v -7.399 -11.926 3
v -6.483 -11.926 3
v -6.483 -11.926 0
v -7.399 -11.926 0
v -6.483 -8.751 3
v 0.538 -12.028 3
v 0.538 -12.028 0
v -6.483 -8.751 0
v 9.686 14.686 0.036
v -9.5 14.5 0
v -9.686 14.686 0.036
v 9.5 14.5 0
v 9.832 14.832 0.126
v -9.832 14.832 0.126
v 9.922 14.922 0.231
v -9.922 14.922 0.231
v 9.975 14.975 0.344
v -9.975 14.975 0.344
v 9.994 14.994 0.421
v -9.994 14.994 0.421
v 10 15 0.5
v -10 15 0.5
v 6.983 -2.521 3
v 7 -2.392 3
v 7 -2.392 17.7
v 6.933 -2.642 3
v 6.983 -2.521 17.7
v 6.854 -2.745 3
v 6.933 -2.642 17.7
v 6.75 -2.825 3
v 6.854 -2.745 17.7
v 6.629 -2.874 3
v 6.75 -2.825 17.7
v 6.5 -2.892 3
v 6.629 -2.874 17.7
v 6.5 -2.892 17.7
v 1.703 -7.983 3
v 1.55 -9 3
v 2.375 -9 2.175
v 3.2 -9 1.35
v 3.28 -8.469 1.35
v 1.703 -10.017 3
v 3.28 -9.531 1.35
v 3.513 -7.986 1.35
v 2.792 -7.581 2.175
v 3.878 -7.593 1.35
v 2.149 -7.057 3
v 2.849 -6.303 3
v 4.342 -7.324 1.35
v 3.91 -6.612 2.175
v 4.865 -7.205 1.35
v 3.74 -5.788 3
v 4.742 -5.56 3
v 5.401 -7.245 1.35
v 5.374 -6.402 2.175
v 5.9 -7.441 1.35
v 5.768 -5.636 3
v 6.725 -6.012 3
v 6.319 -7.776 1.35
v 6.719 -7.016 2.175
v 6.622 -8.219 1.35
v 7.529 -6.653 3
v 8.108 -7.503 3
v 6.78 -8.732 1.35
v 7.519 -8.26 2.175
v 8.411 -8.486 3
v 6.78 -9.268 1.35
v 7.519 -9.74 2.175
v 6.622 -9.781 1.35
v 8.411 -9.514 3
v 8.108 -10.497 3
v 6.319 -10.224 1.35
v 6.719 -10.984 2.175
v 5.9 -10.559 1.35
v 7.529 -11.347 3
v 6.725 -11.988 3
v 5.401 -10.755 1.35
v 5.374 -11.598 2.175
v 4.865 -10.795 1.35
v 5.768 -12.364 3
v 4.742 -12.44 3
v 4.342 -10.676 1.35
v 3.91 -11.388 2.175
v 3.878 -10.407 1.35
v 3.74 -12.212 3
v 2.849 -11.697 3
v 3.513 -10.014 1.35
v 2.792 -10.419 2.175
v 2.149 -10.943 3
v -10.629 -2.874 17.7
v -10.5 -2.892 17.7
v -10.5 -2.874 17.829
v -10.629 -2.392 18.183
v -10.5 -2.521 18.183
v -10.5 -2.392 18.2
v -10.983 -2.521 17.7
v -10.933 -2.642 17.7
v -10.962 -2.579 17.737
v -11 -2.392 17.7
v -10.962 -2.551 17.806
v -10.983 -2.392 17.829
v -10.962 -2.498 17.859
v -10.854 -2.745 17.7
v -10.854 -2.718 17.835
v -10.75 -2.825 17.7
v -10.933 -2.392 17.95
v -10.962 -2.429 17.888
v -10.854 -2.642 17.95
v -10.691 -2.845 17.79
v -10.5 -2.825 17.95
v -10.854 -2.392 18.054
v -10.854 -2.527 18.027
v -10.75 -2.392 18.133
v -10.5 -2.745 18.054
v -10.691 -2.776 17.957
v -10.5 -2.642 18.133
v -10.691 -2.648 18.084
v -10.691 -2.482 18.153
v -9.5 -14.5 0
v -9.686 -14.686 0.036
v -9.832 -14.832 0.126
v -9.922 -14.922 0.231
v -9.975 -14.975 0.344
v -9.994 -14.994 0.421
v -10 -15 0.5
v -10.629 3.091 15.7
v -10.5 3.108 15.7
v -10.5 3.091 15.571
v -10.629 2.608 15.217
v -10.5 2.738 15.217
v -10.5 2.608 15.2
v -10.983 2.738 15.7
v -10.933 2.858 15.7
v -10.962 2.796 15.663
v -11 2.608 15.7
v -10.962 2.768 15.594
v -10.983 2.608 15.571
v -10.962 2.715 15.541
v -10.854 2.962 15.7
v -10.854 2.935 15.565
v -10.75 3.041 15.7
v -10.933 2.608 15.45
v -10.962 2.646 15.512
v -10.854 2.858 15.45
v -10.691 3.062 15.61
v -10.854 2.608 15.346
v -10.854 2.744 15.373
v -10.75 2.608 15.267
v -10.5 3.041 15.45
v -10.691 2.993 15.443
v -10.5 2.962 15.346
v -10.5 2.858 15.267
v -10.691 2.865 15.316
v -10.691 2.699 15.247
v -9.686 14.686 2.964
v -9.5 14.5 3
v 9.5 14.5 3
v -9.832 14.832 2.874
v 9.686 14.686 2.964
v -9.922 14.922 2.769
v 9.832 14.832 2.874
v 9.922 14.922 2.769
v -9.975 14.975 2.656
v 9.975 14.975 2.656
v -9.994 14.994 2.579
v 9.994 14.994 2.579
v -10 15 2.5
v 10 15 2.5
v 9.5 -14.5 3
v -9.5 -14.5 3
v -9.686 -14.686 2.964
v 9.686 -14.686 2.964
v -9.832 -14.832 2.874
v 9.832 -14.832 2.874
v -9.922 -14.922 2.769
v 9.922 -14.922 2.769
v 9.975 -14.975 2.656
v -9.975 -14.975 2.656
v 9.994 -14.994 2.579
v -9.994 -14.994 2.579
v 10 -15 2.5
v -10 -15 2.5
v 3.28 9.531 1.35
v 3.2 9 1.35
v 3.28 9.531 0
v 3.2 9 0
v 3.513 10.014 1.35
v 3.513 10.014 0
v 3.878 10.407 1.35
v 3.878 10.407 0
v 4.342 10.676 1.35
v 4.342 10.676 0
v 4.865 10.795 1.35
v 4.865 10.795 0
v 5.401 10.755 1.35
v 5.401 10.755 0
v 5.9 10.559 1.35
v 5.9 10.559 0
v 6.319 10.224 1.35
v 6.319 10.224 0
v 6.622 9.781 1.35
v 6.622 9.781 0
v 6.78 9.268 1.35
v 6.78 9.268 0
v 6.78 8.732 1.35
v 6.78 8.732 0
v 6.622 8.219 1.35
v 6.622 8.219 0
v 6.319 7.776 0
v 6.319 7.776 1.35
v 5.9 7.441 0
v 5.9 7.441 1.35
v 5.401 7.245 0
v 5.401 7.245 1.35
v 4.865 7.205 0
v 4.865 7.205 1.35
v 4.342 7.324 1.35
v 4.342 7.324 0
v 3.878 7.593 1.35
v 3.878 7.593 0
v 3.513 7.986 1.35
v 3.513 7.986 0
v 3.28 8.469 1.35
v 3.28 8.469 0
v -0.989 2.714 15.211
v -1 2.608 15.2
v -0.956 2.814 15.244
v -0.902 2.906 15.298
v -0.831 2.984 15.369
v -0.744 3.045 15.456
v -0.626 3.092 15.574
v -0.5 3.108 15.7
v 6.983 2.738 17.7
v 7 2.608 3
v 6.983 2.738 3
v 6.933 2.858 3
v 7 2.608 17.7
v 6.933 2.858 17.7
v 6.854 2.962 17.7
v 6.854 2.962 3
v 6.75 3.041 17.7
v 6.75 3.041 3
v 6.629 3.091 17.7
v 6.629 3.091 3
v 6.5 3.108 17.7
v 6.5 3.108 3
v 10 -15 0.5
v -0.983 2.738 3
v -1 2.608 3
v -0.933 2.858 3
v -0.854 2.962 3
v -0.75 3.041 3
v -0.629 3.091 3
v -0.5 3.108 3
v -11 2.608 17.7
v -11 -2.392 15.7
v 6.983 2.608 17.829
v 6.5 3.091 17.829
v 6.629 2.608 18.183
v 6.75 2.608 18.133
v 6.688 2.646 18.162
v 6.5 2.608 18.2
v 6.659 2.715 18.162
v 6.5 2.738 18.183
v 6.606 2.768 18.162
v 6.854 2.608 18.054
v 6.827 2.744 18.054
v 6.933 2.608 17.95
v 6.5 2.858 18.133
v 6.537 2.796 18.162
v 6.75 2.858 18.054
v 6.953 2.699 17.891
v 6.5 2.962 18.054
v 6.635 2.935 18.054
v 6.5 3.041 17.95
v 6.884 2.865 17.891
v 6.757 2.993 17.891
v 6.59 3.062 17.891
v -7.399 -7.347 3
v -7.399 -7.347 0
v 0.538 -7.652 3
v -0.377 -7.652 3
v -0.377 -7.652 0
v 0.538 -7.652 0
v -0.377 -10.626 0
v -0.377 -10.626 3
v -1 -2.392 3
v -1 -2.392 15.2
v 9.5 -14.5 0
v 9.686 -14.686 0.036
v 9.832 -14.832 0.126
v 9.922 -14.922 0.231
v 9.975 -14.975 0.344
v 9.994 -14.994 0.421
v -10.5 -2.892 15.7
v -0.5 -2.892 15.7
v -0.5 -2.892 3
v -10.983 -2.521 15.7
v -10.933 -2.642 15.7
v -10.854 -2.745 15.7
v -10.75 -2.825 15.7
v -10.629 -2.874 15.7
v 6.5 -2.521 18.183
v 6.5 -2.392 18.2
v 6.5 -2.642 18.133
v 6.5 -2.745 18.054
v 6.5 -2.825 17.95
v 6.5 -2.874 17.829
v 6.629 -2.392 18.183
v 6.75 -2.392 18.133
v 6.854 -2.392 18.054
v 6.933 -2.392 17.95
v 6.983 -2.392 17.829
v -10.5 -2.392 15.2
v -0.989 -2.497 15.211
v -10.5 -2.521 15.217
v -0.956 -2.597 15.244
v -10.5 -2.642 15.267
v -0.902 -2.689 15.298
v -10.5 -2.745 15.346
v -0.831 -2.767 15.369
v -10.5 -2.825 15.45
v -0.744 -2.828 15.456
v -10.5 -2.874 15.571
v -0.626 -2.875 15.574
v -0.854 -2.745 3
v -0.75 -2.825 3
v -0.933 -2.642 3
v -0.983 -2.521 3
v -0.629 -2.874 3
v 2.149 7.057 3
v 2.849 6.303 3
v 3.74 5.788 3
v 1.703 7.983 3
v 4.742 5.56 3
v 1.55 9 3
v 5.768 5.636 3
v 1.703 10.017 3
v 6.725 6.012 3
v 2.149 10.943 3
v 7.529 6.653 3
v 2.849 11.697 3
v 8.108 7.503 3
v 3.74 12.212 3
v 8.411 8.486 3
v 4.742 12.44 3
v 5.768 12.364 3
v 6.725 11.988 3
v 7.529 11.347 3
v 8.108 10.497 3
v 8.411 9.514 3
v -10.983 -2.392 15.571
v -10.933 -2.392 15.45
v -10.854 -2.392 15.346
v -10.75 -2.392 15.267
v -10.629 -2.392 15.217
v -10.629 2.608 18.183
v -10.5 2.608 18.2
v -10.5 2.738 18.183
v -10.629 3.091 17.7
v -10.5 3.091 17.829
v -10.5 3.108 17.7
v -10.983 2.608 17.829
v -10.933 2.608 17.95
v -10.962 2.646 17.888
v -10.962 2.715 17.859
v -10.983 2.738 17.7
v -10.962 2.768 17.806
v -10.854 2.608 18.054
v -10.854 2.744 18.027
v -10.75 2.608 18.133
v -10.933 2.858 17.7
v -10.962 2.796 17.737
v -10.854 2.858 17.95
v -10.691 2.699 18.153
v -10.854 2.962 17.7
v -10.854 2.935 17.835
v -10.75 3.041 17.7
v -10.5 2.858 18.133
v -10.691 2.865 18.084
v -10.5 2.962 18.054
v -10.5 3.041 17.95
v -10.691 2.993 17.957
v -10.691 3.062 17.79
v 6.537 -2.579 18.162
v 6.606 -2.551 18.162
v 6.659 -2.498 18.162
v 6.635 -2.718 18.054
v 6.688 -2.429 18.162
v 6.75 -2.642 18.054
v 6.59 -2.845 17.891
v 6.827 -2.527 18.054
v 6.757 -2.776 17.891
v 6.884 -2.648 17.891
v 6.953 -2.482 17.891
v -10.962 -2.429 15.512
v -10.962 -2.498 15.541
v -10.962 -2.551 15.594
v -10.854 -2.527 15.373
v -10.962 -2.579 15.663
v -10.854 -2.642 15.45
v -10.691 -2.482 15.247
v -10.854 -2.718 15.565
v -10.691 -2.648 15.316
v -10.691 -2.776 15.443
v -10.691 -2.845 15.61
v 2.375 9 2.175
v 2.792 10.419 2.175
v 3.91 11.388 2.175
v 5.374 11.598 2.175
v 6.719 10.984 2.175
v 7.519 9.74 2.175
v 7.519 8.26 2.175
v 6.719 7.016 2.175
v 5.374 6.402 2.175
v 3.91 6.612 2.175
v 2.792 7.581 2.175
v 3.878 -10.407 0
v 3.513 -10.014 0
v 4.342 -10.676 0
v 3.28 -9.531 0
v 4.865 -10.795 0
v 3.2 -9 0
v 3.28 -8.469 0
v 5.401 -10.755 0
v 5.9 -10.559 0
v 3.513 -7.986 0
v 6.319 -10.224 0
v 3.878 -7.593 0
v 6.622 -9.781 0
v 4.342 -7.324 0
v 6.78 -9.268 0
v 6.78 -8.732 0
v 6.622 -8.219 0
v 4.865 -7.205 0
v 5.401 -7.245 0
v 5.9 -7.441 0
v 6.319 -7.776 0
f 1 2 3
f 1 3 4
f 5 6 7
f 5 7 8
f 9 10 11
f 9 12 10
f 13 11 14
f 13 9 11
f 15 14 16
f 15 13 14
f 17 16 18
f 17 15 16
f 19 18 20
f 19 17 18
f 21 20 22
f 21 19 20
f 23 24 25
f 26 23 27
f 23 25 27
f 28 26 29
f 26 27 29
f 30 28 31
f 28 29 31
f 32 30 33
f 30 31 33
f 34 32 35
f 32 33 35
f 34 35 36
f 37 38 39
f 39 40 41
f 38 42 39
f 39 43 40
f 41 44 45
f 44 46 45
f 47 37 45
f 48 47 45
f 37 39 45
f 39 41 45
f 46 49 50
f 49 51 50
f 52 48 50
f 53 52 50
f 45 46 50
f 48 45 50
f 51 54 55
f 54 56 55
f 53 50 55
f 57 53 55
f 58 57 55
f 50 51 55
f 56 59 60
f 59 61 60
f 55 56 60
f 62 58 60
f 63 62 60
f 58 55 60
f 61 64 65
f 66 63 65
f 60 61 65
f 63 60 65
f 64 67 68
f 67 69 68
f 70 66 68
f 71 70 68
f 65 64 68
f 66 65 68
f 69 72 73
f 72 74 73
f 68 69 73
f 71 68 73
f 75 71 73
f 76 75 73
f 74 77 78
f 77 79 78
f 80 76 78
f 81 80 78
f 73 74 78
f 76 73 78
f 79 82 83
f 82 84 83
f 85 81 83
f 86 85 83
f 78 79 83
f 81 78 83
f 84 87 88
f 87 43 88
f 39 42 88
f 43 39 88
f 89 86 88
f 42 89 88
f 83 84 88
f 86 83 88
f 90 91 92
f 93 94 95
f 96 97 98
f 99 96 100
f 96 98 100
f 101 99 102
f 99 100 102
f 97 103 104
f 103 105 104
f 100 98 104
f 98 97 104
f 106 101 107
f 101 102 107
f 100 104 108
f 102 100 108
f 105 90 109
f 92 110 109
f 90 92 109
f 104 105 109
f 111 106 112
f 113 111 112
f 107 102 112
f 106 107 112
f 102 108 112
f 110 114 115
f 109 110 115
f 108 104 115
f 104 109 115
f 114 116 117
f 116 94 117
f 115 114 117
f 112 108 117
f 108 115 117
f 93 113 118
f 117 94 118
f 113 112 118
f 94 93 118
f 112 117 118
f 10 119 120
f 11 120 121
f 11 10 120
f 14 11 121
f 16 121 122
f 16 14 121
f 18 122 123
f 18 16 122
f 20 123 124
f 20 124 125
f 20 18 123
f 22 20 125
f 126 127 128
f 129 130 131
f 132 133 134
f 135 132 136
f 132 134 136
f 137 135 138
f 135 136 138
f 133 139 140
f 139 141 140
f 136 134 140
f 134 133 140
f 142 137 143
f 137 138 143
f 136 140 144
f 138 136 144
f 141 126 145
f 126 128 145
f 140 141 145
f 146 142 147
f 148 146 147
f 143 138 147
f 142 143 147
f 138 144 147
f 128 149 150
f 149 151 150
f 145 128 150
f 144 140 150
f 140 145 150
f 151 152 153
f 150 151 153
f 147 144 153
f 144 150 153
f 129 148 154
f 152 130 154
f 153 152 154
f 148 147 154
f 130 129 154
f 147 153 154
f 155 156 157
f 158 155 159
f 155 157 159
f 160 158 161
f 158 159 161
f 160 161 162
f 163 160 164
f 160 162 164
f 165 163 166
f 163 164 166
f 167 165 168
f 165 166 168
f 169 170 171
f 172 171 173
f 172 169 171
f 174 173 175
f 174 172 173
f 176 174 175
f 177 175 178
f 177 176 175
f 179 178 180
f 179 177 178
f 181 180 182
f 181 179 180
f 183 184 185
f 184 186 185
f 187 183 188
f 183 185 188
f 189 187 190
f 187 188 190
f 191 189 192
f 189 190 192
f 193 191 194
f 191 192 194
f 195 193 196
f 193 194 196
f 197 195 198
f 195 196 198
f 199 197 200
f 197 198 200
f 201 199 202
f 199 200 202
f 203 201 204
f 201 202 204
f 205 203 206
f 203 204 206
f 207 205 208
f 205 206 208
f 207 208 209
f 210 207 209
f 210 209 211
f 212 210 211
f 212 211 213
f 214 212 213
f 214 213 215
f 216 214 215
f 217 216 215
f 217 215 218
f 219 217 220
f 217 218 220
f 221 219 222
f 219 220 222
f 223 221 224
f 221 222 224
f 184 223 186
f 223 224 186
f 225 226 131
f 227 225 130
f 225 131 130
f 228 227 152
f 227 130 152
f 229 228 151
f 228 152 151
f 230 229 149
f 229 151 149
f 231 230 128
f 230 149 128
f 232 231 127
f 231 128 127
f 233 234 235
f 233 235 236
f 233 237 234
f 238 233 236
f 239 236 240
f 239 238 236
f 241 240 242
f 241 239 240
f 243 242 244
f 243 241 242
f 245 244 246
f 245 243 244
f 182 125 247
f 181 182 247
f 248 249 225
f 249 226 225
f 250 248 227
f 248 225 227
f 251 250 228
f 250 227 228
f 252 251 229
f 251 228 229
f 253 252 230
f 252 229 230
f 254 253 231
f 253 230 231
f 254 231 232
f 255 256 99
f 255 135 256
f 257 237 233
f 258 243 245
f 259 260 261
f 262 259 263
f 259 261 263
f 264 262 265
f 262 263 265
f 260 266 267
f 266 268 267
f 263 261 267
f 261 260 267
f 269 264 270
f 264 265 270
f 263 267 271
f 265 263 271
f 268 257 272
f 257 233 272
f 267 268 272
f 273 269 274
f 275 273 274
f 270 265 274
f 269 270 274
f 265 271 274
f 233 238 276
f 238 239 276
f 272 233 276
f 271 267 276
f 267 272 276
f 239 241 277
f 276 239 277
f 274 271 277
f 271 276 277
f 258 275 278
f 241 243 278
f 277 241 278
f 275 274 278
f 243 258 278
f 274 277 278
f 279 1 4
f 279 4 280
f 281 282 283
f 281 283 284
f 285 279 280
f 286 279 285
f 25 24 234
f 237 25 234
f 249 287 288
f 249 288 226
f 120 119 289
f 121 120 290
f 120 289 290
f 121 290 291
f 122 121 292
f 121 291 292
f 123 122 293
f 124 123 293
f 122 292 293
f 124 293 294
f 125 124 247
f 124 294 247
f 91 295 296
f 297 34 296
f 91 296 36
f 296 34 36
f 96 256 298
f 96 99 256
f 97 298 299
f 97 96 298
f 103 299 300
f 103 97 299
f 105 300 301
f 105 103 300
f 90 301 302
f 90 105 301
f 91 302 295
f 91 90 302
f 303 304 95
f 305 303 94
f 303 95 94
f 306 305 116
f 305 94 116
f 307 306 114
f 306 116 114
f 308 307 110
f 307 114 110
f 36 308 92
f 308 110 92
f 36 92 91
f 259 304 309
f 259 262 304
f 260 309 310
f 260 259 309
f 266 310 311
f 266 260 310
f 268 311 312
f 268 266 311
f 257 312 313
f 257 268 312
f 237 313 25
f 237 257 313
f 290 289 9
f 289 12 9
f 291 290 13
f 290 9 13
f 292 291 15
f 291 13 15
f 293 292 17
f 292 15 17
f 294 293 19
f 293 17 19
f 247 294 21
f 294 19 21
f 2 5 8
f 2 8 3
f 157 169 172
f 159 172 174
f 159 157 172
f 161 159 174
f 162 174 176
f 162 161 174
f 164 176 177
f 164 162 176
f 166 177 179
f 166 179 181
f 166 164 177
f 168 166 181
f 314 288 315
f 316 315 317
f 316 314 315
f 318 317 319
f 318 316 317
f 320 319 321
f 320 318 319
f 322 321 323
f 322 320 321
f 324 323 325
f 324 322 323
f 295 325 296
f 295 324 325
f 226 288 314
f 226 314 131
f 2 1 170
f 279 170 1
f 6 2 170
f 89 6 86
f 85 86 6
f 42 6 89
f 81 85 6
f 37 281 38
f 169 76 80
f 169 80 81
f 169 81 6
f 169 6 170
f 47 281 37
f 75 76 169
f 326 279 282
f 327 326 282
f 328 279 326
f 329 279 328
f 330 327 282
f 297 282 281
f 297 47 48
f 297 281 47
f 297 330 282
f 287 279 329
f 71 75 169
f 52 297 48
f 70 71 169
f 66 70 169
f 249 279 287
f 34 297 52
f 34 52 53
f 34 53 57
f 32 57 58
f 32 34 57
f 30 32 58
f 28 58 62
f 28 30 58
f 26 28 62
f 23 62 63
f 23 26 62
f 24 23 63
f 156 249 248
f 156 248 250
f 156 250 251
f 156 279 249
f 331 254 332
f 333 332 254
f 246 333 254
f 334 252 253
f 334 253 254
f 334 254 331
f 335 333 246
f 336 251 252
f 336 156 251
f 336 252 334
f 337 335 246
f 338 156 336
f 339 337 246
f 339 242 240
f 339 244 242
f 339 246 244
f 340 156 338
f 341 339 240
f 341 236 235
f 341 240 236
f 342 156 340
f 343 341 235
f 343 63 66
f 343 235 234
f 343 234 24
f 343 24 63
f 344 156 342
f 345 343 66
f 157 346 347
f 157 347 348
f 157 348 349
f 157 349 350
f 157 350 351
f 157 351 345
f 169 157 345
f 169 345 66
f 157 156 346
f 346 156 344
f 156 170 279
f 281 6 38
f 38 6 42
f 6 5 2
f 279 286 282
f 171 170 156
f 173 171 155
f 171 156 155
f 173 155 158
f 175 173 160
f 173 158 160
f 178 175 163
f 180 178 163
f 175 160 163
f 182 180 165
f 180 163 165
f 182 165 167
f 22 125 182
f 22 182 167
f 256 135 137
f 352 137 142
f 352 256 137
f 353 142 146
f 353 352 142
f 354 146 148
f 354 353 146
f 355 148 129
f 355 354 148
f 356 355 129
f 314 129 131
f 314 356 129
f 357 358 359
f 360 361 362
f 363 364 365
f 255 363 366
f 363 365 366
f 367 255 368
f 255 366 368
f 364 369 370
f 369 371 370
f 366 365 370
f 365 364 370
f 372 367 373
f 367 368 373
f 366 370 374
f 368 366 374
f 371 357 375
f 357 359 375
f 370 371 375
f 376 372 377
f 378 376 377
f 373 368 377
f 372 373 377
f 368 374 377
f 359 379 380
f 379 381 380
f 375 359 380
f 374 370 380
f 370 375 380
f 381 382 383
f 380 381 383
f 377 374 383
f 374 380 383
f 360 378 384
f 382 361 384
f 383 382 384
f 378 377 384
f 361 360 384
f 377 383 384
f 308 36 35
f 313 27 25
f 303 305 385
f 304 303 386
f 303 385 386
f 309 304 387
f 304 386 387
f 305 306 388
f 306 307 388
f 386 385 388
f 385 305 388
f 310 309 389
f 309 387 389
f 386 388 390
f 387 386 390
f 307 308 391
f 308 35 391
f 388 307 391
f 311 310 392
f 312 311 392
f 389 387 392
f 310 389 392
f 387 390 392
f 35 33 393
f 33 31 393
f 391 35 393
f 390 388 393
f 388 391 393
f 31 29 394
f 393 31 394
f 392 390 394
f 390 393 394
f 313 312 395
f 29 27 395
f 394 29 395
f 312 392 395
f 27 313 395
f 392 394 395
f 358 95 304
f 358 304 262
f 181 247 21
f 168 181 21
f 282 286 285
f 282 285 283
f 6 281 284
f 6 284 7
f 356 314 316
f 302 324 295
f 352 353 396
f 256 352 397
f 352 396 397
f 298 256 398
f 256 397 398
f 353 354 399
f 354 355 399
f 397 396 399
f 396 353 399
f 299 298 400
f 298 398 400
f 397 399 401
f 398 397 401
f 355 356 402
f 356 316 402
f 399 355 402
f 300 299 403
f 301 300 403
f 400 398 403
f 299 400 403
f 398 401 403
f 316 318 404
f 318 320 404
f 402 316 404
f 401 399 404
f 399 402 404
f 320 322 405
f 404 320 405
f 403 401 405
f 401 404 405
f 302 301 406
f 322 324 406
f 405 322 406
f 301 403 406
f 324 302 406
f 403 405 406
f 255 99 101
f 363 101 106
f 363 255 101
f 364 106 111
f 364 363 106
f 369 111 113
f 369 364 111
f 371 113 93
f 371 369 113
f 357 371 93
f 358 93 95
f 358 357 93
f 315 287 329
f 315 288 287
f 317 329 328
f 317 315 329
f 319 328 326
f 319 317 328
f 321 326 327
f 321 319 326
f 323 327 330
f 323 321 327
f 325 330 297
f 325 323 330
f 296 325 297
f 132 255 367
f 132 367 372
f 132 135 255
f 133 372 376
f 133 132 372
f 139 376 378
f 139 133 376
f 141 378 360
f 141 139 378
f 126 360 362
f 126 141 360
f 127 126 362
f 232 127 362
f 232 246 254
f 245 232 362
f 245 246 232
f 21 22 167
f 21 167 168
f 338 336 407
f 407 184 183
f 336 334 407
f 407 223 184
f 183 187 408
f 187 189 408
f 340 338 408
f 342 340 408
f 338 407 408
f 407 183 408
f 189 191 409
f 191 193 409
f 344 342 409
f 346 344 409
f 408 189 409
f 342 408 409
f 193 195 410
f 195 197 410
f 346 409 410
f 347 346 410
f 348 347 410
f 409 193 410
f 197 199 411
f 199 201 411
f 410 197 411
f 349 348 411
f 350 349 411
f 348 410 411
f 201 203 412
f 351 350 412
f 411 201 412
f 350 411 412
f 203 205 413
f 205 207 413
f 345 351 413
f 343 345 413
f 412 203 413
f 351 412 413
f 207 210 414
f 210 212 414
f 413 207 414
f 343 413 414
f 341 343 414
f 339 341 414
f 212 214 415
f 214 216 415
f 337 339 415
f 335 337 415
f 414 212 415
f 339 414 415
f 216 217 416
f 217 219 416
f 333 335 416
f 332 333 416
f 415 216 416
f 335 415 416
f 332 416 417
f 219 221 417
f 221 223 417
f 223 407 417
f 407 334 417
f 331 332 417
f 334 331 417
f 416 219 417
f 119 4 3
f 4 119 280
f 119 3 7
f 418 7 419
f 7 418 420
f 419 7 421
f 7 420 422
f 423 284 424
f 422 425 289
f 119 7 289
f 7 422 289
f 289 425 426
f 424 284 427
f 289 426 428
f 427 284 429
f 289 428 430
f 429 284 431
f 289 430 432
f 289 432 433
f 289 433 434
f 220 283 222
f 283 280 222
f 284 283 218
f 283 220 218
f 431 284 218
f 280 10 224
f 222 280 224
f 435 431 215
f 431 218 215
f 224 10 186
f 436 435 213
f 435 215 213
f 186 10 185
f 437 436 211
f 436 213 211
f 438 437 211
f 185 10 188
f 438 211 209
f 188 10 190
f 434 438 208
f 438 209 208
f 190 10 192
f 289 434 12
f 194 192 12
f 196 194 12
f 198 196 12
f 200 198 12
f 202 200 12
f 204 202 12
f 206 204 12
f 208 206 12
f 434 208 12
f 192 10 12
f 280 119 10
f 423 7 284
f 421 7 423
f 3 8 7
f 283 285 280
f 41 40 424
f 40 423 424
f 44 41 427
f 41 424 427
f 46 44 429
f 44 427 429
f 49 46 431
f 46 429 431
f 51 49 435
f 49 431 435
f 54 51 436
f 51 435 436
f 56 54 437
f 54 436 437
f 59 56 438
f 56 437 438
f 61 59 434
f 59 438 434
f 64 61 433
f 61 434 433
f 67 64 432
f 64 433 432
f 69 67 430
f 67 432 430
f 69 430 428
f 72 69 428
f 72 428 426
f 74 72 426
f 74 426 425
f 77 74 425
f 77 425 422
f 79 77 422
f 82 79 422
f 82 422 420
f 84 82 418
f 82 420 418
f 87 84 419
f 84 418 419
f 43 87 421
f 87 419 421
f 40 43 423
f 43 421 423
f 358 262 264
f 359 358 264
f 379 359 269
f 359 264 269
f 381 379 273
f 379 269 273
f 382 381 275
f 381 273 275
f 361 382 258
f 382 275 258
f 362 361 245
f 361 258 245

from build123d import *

# Parameters (mm, degrees)
SKETCH1_W                                           = 20
SKETCH1_H                                           = 30
BOSS_EXTRUDE1_DEPTH                                 = 3
CSK_FOR_M3_COUNTERSUNK_FLAT_HEAD_SCREW1_D           = 3.6
CSK_FOR_M3_COUNTERSUNK_FLAT_HEAD_SCREW1_DEPTH       = 20
CSK_FOR_M3_COUNTERSUNK_FLAT_HEAD_SCREW1_CSINK_D     = 6.9
CSK_FOR_M3_COUNTERSUNK_FLAT_HEAD_SCREW1_CSINK_ANGLE = 90
CSK_FOR_M3_COUNTERSUNK_FLAT_HEAD_SCREW1_TIP         = 1.081549114
SKETCH4_W                                           = 8
SKETCH4_H                                           = 6
BOSS_EXTRUDE2_DEPTH                                 = 15.2
SKETCH5_W                                           = 3
SKETCH5_H                                           = 6
BOSS_EXTRUDE3_DEPTH                                 = 10
FILLET2_R                                           = 0.5
CUT_EXTRUDE1_DEPTH                                  = 4
FILLET3_R                                           = 0.5


with BuildPart() as part:
    # Sketch1 → Boss-Extrude1 (new body)
    with BuildSketch(Plane.XY):
        Rectangle(SKETCH1_W, SKETCH1_H)
    extrude(amount=BOSS_EXTRUDE1_DEPTH)

    # CSK for M3 Countersunk Flat Head Screw1
    with Locations(Plane(origin=(5, 9, 3), x_dir=(1, 0, 0), z_dir=(0, 0, 1))):
        with Locations((0, 0), (0, -18)):
            CounterSinkHole(CSK_FOR_M3_COUNTERSUNK_FLAT_HEAD_SCREW1_D / 2, CSK_FOR_M3_COUNTERSUNK_FLAT_HEAD_SCREW1_CSINK_D / 2, depth=CSK_FOR_M3_COUNTERSUNK_FLAT_HEAD_SCREW1_DEPTH, counter_sink_angle=CSK_FOR_M3_COUNTERSUNK_FLAT_HEAD_SCREW1_CSINK_ANGLE)
            with Locations((0, 0, -(CSK_FOR_M3_COUNTERSUNK_FLAT_HEAD_SCREW1_DEPTH + CSK_FOR_M3_COUNTERSUNK_FLAT_HEAD_SCREW1_TIP / 2))):  # 118° drill point
                Cone(0, CSK_FOR_M3_COUNTERSUNK_FLAT_HEAD_SCREW1_D / 2, CSK_FOR_M3_COUNTERSUNK_FLAT_HEAD_SCREW1_TIP, mode=Mode.SUBTRACT)

    # Sketch4 → Boss-Extrude2 (add)
    with BuildSketch(Plane.XY.offset(3)):
        with Locations((3, 0.108485118)):
            Rectangle(SKETCH4_W, SKETCH4_H)
    extrude(amount=BOSS_EXTRUDE2_DEPTH)

    # Sketch5 → Boss-Extrude3 (add)
    with BuildSketch(Plane.ZY.offset(1)):
        with Locations((16.7, 0.108485118)):
            Rectangle(SKETCH5_W, SKETCH5_H)
    extrude(amount=BOSS_EXTRUDE3_DEPTH)

    # Fillet2
    fillet2_edges = [part.edges().sort_by_distance(p)[0] for p in [
        (10, 0, 3),
        (0, 15, 3),
        (7, -2.891514882, 10.6),
        (7, 3.108485118, 10.6),
        (-2, -2.891514882, 18.2),
        (7, 0.108485118, 18.2),
        (-2, 3.108485118, 18.2),
        (-1, 3.108485118, 9.1),
        (-10, 0, 3),
        (-1, -2.891514882, 9.1),
        (-6, 3.108485118, 15.2),
        (-6, -2.891514882, 15.2),
        (0, 15, 0),
        (10, 0, 0),
        (0, -15, 0),
        (-10, 0, 0),
        (0, -15, 3),
    ]]
    fillet(fillet2_edges, radius=FILLET2_R)

    # Sketch6 → Cut-Extrude1 (cut, through all)
    with BuildSketch(Plane.XY.offset(3)):
        Polygon((-0.377386615, -7.652187056), (0.53847877, -7.652187056), (0.53847877, -12.027988338), (-6.483155845, -8.750907509), (-6.483155845, -11.926225518), (-7.39902123, -11.926225518), (-7.39902123, -7.346898595), (-0.377386615, -10.625569468), align=None)
    extrude(amount=-CUT_EXTRUDE1_DEPTH, mode=Mode.SUBTRACT)

    # Fillet3
    fillet3_edges = [part.edges().sort_by_distance(p)[0] for p in [
        (-11, -2.891514882, 16.7),
        (-11, 0.108485118, 15.2),
        (-11, 0.108485118, 18.2),
        (-11, 3.108485118, 16.7),
        (-11, 2.962038509, 15.346446609),
        (-11, 2.962038509, 18.053553391),
        (-11, -2.745068272, 18.053553391),
        (-11, -2.745068272, 15.346446609),
    ]]
    fillet(fillet3_edges, radius=FILLET3_R)


solid = part.part
